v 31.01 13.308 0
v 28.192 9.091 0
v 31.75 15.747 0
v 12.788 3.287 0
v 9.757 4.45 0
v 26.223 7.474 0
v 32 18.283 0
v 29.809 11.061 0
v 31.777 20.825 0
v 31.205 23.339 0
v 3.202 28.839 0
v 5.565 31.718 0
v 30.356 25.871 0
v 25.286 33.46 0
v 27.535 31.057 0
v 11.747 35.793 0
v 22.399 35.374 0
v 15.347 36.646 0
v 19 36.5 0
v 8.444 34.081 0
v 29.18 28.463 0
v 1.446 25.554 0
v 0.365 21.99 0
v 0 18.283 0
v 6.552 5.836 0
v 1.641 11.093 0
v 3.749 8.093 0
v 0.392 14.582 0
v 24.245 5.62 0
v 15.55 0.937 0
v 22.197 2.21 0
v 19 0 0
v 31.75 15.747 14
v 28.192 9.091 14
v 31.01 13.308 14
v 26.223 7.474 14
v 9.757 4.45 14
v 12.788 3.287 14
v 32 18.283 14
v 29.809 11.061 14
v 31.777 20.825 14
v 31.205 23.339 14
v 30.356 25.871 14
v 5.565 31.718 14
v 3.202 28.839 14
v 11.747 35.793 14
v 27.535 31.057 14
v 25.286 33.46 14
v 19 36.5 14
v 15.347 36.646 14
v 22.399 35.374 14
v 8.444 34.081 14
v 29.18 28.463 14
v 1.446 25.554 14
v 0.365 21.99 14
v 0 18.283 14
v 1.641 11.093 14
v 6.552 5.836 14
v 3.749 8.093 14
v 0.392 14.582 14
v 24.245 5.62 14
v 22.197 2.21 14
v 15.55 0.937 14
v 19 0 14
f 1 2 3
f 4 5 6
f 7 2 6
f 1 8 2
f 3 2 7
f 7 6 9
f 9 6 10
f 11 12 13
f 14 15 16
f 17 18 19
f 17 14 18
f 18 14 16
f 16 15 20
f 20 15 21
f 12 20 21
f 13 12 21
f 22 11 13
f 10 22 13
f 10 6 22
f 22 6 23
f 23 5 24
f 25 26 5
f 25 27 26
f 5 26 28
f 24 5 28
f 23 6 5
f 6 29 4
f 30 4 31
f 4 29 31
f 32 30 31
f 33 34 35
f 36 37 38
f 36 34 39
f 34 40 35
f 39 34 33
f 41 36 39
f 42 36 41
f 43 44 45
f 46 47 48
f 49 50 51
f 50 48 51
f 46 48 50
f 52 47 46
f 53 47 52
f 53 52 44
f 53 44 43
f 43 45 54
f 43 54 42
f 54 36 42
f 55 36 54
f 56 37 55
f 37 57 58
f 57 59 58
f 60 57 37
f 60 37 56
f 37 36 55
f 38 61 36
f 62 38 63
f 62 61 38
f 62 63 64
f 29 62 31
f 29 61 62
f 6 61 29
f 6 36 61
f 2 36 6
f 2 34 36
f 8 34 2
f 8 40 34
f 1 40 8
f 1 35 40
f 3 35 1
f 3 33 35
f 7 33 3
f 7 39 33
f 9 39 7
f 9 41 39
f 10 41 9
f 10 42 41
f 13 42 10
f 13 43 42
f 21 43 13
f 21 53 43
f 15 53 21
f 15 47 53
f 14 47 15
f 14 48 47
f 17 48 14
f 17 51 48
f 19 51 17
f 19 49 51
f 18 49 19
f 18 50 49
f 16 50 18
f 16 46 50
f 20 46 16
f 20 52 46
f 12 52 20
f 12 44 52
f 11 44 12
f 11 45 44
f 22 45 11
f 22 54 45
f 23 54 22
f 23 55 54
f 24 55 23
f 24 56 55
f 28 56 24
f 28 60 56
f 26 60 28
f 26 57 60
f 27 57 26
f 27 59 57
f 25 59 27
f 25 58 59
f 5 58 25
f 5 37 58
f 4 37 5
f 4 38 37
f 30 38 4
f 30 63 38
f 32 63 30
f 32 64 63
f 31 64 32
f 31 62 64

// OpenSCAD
$fn = 32;

// ----------------------------------------------------------------------
// Cam disc: base radius 13.0 mm, lift 6.0 mm, 32 profile points
// ----------------------------------------------------------------------

// --- parameters (mm) ---
profile_height = 14;      // extrusion height
profile_points = 32;      // points of the closed outline

profile = [[32, 18.283], [31.777, 20.825], [31.205, 23.339], [30.356, 25.871], [29.18, 28.463], [27.535, 31.057], [25.286, 33.46], [22.399, 35.374], [19, 36.5], [15.347, 36.646], [11.747, 35.793], [8.444, 34.081], [5.565, 31.718], [3.202, 28.839], [1.446, 25.554], [0.365, 21.99], [0, 18.283], [0.392, 14.582], [1.641, 11.093], [3.749, 8.093], [6.552, 5.836], [9.757, 4.45], [12.788, 3.287], [15.55, 0.937], [19, 0], [22.197, 2.21], [24.245, 5.62], [26.223, 7.474], [28.192, 9.091], [29.809, 11.061], [31.01, 13.308], [31.75, 15.747]];  // single closed polygon, 32 points, counter clockwise

// --- the one profile operation ---
linear_extrude(height = profile_height) polygon(points = profile);
